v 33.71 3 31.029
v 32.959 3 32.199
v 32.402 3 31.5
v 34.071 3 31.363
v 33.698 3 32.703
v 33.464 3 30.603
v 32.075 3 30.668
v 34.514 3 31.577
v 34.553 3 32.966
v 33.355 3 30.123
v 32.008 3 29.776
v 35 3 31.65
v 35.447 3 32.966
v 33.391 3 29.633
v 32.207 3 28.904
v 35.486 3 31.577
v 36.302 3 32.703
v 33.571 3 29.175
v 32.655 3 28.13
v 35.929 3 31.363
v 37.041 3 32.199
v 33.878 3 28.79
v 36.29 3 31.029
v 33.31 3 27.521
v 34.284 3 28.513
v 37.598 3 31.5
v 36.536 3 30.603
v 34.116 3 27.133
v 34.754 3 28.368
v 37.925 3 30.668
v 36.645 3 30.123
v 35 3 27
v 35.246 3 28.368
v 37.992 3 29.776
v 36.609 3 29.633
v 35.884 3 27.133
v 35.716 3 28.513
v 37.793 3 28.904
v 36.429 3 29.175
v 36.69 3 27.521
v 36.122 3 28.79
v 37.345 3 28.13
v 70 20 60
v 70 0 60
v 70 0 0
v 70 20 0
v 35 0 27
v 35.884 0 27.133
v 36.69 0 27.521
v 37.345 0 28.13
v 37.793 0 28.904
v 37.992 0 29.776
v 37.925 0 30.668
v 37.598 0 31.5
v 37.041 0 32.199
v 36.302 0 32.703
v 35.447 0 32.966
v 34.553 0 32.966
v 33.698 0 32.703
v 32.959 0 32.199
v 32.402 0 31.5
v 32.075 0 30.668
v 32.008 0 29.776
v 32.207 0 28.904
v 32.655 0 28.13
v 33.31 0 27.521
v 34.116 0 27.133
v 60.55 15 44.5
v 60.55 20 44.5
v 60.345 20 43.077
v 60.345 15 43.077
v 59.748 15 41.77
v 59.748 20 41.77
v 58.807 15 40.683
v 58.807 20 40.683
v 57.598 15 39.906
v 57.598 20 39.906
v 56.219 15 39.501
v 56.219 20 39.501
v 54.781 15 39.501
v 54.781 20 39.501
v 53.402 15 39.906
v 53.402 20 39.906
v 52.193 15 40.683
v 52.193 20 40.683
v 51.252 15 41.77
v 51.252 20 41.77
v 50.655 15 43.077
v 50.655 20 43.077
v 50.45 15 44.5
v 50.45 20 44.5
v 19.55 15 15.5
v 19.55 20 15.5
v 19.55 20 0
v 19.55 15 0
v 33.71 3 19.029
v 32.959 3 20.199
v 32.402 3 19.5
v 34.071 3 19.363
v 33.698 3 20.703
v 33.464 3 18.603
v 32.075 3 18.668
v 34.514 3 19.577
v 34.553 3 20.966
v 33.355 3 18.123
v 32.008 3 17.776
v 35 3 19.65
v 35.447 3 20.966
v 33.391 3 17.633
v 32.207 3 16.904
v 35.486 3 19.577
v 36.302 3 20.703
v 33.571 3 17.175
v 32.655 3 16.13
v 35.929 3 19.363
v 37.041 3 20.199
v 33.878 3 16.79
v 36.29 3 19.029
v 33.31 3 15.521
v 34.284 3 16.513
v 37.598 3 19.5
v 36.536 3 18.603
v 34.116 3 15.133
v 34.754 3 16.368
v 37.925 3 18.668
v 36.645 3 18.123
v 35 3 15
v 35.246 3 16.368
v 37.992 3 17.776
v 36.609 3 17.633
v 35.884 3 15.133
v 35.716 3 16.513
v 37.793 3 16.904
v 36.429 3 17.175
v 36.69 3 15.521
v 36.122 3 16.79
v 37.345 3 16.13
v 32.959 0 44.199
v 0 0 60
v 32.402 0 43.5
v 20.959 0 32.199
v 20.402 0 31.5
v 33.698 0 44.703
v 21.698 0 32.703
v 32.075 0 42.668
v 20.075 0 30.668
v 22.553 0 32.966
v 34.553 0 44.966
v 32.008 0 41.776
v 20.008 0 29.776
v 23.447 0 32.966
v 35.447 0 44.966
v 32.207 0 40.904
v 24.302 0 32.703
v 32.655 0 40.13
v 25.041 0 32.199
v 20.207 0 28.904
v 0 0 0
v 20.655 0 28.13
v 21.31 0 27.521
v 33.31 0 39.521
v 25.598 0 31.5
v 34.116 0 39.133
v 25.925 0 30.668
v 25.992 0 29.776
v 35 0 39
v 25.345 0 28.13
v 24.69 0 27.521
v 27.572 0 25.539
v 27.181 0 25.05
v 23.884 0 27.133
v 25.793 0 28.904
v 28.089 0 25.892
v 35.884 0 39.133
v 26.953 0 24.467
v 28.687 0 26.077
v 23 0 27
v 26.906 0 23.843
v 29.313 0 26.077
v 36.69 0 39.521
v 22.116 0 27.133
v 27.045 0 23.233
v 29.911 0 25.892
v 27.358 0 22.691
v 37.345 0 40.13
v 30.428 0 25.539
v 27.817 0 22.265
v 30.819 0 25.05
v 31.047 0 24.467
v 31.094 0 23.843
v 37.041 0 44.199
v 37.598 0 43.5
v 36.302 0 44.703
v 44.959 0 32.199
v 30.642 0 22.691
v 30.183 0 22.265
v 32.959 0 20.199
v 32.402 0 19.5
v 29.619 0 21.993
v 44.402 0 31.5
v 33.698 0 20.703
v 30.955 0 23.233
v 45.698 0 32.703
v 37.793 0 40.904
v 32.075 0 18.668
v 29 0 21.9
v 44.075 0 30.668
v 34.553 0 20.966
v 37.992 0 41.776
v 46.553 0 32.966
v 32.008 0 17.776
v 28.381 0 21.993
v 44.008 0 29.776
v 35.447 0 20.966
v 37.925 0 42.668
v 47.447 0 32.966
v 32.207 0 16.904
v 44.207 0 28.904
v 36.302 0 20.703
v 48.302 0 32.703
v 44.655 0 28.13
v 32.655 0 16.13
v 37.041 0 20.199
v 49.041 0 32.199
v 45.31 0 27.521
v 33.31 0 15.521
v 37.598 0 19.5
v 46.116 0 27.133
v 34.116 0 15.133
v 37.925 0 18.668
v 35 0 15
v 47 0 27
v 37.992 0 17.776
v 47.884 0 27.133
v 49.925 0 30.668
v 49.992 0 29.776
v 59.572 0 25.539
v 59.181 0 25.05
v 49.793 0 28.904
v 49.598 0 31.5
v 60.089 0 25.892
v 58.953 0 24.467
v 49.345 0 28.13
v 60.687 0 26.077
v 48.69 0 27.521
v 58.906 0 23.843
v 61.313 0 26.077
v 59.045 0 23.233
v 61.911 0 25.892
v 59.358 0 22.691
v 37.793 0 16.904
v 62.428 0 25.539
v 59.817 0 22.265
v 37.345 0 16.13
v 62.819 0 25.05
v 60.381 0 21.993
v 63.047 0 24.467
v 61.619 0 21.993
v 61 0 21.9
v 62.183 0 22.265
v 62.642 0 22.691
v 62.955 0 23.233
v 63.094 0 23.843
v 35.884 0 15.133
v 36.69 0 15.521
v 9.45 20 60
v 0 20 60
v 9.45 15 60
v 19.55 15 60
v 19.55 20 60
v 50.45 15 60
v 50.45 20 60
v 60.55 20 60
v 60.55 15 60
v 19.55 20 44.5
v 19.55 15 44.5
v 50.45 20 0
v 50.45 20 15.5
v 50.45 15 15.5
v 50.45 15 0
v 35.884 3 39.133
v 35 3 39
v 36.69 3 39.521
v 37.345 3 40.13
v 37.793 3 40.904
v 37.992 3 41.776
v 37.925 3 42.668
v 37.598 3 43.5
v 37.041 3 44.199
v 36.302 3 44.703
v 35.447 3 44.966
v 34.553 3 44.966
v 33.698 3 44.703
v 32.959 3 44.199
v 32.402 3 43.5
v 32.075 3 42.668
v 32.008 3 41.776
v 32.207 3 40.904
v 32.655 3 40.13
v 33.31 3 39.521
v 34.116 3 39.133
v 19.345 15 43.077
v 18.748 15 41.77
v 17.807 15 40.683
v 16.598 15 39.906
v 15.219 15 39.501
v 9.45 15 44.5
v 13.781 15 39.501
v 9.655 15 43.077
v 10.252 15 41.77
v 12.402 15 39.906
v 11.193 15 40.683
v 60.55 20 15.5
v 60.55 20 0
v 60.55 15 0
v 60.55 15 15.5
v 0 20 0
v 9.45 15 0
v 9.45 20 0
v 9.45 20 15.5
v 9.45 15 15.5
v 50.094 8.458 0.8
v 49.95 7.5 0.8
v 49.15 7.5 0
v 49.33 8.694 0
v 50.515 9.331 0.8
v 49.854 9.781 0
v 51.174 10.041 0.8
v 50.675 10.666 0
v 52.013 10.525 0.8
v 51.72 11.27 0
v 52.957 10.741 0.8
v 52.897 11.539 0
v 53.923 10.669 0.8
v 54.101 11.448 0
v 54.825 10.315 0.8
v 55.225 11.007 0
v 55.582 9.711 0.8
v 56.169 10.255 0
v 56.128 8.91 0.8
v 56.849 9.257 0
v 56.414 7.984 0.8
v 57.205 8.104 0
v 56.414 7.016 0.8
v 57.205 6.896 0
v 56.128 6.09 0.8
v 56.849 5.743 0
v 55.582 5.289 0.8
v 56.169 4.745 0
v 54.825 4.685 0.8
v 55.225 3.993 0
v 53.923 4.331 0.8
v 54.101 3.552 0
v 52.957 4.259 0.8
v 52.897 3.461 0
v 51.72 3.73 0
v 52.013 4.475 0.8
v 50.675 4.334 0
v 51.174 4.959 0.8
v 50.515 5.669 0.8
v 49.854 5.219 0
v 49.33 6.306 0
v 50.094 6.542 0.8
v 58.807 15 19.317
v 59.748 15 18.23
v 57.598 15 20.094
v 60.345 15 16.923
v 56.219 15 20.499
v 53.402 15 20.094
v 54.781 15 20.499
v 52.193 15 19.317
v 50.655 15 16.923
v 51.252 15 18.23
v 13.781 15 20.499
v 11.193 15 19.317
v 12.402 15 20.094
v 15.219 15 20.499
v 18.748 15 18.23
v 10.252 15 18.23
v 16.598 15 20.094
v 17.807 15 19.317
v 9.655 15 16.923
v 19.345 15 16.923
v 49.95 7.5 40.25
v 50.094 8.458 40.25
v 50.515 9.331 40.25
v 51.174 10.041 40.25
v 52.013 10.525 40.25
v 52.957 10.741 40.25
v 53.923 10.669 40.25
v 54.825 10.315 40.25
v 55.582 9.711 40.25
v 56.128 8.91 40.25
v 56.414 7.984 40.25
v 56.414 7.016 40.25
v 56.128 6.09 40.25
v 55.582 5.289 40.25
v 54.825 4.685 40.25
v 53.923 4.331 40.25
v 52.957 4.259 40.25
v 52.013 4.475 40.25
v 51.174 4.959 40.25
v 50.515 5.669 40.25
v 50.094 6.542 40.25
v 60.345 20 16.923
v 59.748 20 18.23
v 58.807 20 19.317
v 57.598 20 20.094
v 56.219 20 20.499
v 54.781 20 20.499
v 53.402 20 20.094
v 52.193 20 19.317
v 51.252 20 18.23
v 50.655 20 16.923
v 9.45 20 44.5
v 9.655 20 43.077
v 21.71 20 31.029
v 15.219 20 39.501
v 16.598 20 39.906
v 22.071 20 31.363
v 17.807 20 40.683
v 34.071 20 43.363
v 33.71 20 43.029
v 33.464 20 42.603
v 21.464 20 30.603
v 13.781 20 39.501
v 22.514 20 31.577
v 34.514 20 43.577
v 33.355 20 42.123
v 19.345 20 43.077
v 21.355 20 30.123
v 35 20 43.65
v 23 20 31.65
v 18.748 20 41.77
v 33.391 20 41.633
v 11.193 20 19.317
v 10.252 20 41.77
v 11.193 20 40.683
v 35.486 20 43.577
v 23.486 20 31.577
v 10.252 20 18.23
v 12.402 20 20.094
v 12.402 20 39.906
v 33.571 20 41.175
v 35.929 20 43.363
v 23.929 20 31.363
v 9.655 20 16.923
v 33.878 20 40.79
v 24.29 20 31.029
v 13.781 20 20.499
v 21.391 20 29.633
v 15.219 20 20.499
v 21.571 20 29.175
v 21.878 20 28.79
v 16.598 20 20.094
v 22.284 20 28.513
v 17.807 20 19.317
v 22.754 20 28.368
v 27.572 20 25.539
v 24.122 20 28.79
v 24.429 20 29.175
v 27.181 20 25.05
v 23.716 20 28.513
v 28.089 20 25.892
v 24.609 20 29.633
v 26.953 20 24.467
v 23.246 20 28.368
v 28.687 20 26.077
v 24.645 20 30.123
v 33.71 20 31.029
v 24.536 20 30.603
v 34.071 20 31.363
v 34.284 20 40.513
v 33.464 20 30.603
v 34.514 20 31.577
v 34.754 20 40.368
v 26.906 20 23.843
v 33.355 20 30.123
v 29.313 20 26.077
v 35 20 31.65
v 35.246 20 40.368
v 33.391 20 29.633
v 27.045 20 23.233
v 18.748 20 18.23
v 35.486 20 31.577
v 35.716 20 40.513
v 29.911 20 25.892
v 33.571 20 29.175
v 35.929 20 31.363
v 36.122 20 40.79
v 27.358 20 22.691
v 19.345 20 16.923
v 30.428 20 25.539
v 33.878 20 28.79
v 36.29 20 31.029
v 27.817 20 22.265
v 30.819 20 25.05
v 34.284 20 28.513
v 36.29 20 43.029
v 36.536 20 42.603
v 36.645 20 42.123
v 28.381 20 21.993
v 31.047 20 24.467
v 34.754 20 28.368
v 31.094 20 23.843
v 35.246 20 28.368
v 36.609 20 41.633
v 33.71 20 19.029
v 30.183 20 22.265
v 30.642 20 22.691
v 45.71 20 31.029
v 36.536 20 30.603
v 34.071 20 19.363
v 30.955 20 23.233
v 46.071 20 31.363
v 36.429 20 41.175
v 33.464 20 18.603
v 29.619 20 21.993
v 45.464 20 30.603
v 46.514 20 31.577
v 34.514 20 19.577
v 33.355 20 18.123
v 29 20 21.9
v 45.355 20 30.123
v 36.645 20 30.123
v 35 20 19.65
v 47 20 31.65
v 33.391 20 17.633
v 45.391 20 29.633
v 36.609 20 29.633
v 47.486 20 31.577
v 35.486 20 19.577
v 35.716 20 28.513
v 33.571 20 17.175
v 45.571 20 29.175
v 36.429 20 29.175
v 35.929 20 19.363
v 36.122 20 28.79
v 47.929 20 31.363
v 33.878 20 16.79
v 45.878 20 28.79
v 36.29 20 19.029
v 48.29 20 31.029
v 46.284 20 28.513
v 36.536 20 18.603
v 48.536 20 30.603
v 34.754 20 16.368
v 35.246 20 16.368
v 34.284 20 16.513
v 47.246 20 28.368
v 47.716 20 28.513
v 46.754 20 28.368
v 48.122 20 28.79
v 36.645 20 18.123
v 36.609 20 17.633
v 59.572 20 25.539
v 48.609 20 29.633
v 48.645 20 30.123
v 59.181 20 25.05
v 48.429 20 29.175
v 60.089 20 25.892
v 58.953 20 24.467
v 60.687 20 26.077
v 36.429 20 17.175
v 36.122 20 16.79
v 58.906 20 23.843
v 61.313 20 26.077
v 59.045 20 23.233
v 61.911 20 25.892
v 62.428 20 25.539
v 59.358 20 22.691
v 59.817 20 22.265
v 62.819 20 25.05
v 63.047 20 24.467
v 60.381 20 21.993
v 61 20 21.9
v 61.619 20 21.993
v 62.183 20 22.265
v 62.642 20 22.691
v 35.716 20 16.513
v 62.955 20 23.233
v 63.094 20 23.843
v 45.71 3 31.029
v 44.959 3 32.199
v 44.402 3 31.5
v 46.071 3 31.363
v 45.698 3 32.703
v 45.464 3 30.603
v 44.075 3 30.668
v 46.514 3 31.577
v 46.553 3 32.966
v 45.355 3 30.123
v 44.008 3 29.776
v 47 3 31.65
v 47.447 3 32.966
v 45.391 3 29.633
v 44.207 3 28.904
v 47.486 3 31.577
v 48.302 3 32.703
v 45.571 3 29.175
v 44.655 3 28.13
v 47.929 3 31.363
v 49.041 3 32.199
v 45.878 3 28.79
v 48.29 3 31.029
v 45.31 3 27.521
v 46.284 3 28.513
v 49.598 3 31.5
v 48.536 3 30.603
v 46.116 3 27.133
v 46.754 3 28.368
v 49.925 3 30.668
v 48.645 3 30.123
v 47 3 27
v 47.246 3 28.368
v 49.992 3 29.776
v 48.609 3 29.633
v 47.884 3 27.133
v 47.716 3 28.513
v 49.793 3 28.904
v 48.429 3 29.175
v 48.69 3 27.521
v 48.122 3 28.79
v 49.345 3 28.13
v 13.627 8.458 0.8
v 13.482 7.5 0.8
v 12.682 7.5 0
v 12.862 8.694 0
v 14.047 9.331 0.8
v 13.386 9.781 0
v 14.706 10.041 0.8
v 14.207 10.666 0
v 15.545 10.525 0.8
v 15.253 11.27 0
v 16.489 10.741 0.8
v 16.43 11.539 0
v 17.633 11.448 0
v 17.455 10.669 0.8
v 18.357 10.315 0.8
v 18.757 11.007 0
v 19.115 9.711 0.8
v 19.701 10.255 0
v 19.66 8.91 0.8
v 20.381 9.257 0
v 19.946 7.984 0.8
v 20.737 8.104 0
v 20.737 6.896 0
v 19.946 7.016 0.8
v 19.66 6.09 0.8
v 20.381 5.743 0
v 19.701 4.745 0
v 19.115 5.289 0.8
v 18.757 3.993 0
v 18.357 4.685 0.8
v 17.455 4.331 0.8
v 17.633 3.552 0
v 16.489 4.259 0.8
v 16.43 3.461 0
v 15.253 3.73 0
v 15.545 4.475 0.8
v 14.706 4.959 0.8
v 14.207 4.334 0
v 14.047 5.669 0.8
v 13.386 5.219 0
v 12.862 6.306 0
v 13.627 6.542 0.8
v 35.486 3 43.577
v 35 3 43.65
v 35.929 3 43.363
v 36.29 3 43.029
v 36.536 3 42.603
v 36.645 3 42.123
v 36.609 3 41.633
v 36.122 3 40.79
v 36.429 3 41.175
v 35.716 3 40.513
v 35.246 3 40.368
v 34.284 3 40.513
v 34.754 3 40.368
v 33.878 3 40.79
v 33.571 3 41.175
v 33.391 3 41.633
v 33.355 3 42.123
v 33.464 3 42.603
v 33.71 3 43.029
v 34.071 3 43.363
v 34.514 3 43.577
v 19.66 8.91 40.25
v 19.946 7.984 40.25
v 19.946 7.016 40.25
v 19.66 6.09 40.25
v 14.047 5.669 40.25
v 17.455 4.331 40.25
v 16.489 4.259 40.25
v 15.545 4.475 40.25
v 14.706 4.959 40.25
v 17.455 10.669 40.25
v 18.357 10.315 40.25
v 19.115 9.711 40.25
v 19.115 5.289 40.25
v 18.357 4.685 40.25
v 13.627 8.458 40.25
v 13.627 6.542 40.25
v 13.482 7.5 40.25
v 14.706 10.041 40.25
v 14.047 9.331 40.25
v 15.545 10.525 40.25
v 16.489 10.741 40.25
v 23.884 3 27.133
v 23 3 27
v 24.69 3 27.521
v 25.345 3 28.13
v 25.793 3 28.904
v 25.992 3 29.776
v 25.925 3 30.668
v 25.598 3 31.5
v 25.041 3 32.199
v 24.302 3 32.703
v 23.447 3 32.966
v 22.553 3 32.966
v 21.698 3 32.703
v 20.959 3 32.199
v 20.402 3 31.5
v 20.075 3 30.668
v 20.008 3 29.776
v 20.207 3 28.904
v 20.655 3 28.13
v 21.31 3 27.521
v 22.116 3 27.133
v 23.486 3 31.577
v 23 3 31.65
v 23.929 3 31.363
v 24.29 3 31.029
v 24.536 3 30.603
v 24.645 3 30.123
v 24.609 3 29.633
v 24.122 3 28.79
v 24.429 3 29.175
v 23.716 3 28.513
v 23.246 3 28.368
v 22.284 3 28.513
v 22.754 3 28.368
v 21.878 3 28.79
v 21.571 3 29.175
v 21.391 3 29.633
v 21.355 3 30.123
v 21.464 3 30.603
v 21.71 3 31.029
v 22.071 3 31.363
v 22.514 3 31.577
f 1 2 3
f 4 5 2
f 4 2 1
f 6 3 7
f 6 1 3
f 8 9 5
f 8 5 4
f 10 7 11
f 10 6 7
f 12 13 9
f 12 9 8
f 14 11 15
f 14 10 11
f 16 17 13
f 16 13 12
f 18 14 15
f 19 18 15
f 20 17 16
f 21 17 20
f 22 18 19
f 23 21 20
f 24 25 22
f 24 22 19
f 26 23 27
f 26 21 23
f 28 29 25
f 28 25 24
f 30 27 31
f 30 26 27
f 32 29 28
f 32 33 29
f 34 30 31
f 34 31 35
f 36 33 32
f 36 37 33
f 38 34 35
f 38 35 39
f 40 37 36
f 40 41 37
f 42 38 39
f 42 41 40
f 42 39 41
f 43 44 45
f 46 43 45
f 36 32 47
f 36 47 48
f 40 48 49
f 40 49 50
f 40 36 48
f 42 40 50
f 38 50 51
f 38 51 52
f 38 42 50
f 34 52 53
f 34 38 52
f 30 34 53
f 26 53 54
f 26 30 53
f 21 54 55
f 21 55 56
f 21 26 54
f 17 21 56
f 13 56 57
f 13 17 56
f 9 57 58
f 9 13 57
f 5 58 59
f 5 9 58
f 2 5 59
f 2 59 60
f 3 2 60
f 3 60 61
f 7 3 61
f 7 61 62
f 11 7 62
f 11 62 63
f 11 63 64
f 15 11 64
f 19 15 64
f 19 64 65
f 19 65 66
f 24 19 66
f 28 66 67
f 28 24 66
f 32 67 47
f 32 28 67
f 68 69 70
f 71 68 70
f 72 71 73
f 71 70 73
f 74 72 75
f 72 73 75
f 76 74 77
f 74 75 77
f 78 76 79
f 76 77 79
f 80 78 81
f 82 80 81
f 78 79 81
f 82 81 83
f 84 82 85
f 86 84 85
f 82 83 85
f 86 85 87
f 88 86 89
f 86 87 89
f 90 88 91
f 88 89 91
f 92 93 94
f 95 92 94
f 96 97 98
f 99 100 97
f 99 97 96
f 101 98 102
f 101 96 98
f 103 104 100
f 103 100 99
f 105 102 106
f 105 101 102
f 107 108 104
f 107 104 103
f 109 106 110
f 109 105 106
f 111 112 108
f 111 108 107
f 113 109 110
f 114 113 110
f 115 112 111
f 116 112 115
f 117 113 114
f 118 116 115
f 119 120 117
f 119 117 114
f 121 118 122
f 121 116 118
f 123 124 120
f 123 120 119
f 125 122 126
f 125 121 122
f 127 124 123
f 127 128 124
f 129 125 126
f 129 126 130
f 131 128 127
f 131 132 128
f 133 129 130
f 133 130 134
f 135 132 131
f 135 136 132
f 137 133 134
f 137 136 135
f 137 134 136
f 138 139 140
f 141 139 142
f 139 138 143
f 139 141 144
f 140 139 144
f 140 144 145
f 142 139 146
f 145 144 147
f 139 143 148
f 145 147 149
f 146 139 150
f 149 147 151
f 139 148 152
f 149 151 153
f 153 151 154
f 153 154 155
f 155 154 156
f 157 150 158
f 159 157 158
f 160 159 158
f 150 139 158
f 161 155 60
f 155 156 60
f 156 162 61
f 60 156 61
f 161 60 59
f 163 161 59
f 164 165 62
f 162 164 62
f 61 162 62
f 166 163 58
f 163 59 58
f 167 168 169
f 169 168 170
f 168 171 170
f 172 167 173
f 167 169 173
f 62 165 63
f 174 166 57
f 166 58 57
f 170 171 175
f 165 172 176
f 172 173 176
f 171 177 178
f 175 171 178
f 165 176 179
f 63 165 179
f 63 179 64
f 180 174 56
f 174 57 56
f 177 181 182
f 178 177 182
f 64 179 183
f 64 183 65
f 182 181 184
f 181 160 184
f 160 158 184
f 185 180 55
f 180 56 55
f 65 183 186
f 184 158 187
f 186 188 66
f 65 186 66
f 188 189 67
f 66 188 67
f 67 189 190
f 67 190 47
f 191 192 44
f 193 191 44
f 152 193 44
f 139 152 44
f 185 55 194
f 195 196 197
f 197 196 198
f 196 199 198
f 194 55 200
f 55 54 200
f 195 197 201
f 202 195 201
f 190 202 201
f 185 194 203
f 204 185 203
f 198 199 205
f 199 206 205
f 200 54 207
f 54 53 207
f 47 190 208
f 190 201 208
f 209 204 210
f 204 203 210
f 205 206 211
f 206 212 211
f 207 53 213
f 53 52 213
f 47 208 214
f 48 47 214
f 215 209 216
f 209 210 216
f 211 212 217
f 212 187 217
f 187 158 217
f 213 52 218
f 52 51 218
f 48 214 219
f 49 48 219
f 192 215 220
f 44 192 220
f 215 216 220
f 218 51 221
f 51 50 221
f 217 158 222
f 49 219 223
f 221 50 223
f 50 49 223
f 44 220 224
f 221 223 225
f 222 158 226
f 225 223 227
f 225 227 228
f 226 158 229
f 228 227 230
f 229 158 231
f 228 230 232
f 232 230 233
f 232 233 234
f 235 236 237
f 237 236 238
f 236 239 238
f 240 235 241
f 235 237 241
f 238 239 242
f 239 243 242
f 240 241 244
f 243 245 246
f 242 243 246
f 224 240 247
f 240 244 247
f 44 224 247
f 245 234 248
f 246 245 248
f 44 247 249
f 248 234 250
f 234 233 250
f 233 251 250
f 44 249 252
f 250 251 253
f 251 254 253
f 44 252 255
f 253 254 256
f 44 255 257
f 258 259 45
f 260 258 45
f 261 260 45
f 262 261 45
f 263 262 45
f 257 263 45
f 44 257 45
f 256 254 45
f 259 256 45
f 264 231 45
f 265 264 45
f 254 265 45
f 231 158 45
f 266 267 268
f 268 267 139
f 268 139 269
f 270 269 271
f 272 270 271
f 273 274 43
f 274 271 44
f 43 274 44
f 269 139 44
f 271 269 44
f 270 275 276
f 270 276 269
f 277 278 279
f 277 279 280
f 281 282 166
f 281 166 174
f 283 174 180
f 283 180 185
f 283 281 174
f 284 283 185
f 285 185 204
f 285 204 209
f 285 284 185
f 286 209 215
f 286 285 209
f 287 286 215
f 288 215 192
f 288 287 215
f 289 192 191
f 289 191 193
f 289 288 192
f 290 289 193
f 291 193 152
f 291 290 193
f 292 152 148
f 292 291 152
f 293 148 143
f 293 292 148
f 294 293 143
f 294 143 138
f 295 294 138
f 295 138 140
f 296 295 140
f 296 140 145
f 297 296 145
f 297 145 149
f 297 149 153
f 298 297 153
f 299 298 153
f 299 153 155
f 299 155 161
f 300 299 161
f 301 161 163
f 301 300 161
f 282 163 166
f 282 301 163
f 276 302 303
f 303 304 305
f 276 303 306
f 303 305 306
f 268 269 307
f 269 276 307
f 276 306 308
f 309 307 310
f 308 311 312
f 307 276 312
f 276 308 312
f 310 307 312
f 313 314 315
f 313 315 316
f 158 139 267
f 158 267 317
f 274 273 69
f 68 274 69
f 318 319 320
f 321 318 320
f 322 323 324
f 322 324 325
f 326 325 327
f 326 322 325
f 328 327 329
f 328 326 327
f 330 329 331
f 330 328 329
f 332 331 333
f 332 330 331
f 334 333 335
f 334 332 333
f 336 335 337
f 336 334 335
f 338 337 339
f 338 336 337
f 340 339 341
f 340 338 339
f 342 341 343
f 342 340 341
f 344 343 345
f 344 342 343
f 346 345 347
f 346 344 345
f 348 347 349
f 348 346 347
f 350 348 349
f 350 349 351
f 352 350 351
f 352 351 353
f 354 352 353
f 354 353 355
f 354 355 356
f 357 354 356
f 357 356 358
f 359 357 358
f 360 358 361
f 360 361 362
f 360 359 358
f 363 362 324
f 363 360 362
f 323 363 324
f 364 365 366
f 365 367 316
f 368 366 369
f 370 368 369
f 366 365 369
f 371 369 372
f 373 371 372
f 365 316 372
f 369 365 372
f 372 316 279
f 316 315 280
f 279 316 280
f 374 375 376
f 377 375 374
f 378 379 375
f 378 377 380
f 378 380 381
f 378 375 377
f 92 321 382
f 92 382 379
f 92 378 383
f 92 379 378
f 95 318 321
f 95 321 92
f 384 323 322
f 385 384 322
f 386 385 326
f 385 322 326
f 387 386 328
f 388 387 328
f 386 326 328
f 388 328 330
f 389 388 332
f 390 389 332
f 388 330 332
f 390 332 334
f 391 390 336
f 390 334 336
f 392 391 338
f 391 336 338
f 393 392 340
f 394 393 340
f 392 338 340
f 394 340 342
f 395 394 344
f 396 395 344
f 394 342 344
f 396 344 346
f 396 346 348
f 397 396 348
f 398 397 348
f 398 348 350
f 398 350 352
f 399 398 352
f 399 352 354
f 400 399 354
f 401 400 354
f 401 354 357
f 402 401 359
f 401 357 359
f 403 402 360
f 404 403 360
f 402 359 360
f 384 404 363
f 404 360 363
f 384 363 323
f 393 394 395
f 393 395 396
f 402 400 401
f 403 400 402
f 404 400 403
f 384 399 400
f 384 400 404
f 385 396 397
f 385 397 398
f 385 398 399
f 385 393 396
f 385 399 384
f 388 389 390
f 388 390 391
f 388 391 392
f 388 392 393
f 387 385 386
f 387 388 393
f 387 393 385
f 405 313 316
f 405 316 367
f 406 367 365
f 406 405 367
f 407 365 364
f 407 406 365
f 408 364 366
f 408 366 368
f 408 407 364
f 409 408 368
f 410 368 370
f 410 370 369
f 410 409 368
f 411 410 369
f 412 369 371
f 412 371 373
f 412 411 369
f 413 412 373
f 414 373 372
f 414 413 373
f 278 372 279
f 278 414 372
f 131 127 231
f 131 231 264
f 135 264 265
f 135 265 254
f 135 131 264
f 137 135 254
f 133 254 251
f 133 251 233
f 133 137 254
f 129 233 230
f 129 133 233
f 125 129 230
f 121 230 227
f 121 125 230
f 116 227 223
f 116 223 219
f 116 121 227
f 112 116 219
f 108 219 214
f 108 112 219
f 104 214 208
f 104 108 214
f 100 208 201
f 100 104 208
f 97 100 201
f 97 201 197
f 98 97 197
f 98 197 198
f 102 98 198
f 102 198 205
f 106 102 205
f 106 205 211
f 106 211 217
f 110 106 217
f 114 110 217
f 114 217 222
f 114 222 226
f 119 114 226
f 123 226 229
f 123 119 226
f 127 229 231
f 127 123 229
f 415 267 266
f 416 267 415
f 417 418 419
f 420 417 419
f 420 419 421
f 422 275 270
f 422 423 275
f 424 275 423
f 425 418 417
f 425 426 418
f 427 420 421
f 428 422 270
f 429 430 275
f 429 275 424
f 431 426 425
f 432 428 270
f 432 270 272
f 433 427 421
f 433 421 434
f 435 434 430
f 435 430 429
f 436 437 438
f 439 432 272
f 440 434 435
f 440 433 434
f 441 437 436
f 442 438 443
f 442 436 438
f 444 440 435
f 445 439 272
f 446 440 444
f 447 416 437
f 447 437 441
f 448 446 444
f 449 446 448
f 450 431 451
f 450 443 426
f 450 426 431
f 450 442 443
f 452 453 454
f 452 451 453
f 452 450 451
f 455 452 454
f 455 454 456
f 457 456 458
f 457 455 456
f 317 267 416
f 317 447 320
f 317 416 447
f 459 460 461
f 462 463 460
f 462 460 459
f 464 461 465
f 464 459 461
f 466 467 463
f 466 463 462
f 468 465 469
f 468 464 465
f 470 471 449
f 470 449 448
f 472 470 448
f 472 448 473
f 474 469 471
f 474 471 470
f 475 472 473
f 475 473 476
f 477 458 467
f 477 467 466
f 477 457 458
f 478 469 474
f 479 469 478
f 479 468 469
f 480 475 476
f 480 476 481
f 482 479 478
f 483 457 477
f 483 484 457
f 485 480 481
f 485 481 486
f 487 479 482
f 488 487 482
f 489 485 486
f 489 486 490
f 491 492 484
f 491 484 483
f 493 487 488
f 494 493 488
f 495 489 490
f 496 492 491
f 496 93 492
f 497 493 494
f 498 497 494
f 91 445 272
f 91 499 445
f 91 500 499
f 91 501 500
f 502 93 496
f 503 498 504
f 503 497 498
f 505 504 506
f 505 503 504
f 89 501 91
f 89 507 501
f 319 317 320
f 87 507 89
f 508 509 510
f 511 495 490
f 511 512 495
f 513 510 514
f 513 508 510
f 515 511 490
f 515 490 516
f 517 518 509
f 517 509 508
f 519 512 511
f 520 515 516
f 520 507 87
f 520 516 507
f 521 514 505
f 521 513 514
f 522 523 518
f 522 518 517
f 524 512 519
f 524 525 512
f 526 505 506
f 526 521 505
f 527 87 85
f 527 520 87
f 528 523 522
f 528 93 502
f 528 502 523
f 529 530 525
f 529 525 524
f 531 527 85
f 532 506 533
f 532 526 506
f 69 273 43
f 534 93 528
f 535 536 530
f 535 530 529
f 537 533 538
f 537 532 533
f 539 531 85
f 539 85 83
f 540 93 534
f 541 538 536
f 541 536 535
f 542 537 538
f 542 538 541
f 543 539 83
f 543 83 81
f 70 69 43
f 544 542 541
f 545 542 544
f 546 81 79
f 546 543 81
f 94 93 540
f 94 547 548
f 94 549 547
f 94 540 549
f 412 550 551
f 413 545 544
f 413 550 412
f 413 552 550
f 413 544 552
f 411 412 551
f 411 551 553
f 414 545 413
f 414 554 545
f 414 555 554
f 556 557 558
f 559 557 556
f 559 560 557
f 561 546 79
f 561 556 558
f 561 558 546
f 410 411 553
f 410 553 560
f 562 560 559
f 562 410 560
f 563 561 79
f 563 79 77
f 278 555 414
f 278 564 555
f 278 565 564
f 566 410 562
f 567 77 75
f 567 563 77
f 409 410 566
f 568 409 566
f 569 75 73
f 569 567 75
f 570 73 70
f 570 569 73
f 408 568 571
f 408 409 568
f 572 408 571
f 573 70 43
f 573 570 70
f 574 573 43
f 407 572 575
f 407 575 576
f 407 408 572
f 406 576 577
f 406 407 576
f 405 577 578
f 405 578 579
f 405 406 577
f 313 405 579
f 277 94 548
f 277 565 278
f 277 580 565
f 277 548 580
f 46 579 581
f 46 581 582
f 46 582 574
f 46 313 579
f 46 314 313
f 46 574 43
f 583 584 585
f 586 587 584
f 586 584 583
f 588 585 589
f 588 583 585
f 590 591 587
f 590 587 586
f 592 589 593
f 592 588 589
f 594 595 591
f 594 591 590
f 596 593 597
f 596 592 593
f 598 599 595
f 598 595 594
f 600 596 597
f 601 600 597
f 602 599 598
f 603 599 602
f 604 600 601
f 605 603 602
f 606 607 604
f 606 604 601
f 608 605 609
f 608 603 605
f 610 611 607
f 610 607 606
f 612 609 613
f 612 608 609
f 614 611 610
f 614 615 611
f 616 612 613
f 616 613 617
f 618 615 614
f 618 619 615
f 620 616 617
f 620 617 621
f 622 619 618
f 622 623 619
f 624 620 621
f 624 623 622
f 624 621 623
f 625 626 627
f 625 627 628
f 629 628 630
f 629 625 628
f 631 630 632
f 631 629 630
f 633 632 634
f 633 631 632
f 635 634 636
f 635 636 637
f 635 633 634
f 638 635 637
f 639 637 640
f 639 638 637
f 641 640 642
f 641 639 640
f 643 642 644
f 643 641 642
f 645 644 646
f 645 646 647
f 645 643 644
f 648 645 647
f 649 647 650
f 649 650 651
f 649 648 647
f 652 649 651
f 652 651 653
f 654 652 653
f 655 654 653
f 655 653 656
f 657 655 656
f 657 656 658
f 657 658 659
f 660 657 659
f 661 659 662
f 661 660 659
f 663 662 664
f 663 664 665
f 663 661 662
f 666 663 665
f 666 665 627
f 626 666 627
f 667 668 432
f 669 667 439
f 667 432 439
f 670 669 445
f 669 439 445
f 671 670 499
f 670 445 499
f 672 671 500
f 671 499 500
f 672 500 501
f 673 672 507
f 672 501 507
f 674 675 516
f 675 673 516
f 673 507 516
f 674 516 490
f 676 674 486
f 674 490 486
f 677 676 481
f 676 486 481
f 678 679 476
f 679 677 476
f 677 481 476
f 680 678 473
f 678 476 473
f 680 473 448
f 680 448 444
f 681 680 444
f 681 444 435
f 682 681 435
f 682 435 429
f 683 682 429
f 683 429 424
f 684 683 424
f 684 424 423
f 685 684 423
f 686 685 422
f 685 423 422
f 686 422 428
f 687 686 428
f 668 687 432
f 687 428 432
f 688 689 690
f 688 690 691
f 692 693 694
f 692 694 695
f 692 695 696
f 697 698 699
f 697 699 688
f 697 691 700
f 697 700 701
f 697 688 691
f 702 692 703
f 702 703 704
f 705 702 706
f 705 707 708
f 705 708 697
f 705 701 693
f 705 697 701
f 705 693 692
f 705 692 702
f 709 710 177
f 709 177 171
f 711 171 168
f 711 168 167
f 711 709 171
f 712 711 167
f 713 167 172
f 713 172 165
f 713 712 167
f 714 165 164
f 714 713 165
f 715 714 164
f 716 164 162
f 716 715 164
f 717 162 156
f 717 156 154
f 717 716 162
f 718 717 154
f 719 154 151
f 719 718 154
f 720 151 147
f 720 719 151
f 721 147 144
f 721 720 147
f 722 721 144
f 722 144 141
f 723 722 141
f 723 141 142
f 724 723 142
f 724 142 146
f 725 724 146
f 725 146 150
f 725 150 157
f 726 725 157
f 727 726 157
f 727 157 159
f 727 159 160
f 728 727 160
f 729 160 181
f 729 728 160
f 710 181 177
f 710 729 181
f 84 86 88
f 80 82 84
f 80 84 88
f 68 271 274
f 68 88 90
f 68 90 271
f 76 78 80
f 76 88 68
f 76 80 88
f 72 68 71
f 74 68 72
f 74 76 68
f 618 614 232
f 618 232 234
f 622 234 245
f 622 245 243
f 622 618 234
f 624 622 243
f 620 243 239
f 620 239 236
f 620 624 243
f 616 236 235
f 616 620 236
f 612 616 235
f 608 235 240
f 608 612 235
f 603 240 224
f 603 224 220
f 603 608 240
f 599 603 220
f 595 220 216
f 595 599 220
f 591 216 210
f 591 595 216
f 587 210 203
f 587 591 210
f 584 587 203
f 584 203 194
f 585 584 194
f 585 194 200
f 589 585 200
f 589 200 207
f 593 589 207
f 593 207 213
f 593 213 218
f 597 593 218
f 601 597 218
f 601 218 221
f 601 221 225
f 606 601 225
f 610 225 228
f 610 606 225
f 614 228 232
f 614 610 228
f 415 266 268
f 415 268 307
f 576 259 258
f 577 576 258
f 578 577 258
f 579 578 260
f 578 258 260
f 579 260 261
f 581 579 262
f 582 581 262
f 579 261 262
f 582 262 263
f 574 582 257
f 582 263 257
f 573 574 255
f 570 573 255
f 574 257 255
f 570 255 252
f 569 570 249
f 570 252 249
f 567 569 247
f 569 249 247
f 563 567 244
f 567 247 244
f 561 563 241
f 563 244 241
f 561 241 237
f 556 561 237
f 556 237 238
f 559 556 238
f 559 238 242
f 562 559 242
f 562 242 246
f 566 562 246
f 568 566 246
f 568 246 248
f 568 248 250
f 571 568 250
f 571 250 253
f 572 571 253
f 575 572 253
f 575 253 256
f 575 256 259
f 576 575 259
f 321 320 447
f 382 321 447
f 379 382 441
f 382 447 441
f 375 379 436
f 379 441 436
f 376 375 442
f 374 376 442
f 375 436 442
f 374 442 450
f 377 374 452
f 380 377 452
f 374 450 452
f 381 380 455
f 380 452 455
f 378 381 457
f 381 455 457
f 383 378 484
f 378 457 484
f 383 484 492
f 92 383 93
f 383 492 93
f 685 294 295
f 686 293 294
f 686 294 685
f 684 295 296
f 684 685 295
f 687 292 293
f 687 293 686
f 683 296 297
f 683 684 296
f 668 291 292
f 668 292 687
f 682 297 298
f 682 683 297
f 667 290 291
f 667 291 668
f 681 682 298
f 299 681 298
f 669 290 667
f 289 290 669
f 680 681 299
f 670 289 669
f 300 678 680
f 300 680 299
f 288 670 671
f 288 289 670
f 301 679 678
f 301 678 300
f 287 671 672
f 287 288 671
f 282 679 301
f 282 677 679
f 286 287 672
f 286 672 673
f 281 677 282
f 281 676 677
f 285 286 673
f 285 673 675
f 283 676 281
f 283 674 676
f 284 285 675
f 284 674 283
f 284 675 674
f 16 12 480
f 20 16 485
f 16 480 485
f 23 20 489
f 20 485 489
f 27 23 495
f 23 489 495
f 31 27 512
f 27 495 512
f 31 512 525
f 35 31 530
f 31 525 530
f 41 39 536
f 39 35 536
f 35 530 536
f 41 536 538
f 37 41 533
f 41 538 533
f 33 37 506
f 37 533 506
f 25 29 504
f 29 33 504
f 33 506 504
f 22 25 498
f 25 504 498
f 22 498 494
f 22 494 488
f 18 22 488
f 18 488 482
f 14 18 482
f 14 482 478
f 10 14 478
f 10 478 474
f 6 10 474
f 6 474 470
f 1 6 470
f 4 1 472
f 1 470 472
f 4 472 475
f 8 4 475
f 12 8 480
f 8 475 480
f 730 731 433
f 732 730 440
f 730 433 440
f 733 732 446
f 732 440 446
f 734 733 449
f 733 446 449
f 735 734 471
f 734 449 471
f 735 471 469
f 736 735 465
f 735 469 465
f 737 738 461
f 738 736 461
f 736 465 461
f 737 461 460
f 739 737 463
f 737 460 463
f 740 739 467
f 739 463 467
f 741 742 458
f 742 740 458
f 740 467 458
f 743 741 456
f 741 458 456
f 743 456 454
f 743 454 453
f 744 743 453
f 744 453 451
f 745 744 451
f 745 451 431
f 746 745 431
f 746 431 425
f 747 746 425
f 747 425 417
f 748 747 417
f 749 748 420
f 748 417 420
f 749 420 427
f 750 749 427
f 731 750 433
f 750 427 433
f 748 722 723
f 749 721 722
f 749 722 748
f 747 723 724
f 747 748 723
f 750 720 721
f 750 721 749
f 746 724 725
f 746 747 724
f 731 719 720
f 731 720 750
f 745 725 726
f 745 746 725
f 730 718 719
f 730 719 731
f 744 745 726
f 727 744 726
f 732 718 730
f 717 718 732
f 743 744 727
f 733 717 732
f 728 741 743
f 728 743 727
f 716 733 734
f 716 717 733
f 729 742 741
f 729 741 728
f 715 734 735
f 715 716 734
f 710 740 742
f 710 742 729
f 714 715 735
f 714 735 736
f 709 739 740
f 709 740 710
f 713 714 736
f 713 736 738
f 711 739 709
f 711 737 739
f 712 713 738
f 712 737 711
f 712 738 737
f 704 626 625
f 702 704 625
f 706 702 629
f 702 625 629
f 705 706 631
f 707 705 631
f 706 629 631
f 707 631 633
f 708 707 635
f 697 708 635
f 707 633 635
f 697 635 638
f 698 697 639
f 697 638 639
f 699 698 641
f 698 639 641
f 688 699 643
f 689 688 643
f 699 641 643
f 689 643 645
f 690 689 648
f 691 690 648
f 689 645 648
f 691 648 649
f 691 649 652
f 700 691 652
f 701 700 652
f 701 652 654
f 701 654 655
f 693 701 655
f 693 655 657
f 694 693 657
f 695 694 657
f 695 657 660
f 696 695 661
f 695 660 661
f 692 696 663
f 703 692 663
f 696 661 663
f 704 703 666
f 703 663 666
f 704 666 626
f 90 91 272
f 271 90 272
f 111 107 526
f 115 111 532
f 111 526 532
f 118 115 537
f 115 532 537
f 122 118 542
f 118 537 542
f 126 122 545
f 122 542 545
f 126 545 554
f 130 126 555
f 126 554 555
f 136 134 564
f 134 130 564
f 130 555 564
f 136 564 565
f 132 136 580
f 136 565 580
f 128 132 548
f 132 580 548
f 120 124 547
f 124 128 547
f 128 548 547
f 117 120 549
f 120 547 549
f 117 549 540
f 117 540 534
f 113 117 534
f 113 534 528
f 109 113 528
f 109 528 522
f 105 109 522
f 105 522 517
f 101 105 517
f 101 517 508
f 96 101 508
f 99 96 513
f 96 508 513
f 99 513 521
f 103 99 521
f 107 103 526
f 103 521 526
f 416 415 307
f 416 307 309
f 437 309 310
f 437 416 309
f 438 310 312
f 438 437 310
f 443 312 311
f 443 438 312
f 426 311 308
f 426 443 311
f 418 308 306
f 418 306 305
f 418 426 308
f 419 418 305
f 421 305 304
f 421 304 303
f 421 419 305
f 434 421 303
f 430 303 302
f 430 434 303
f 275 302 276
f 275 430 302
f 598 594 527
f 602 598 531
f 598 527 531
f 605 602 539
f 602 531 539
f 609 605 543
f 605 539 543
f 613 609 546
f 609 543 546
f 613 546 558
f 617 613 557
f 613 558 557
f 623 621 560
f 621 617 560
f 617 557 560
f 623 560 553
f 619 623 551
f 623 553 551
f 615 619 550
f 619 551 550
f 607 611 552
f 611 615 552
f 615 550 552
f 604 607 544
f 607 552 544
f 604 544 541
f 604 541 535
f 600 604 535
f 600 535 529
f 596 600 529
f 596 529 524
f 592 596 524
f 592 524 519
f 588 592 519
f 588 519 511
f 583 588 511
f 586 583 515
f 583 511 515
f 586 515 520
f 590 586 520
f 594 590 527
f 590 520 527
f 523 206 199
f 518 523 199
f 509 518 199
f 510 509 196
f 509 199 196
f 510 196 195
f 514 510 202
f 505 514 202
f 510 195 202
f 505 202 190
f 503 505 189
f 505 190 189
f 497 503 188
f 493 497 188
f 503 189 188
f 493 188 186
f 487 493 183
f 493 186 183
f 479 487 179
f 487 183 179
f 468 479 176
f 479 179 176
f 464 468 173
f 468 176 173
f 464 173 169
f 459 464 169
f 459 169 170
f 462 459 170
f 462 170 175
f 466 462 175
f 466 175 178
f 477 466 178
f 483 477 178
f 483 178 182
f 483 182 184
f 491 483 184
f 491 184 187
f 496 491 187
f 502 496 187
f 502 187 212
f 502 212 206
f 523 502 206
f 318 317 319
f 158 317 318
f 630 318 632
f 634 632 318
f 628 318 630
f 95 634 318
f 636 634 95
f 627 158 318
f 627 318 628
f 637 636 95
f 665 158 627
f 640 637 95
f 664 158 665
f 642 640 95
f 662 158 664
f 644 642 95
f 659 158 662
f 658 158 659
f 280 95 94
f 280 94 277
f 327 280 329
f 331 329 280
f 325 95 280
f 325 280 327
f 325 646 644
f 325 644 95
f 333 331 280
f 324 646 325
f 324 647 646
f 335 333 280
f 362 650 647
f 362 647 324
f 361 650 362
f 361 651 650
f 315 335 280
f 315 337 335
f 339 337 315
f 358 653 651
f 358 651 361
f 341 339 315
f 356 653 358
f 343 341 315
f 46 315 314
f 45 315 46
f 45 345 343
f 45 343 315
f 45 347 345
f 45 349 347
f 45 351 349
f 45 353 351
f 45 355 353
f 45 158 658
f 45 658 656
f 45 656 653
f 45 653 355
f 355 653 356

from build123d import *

# Parameters (mm, degrees)
SKETCH3_W           = 70
SKETCH3_H           = 60
BOSS_EXTRUDE3_DEPTH = 20
SKETCH4_R           = 1.65
CUT_EXTRUDE1_DEPTH  = 95.339811321
SKETCH6_R           = 2.1
CUT_EXTRUDE2_DEPTH  = 95.339811321
SKETCH9_R           = 3.25
CUT_EXTRUDE3_DEPTH  = 40.25
CUT_EXTRUDE4_START  = -3
SKETCH11_R          = 3
SKETCH11_R_2        = 1.65
CUT_EXTRUDE4_DEPTH  = 3
CHAMFER1_SIZE       = 0.8
CUT_EXTRUDE5_DEPTH  = 5


with BuildPart() as part:
    # Sketch3 → Boss-Extrude3 (new body)
    with BuildSketch(Plane(origin=(0, 0, 0), x_dir=(1, 0, 0), z_dir=(0, 1, 0))):
        with Locations((35, -30)):
            Rectangle(SKETCH3_W, SKETCH3_H)
    extrude(amount=BOSS_EXTRUDE3_DEPTH)

    # Sketch4 → Cut-Extrude1 (cut, through all)
    with BuildSketch(Plane(origin=(0, 20, 0), x_dir=(1, 0, 0), z_dir=(0, 1, 0))):
        with Locations(Location((35, -30, 0), (0, 0, 270))):
            Circle(SKETCH4_R)
        with Locations(Location((35, -18, 0), (0, 0, 270))):
            Circle(SKETCH4_R)
        with Locations(Location((47, -30, 0), (0, 0, 270))):
            Circle(SKETCH4_R)
        with Locations(Location((35, -42, 0), (0, 0, 270))):
            Circle(SKETCH4_R)
        with Locations(Location((23, -30, 0), (0, 0, 270))):
            Circle(SKETCH4_R)
    extrude(amount=-CUT_EXTRUDE1_DEPTH, mode=Mode.SUBTRACT)

    # Sketch6 → Cut-Extrude2 (cut, through all)
    with BuildSketch(Plane.XZ):
        with Locations(Location((61, 24, 0), (0, 0, 270))):
            Circle(SKETCH6_R)
        with Locations(Location((29, 24, 0), (0, 0, 270))):
            Circle(SKETCH6_R)
    extrude(amount=-CUT_EXTRUDE2_DEPTH, mode=Mode.SUBTRACT)

    # Sketch9 → Cut-Extrude3 (cut)
    with BuildSketch(Plane(origin=(0, 0, 0), x_dir=(-1, 0, 0), z_dir=(0, 0, -1))):
        with Locations((-53.2, 7.5)):
            Circle(SKETCH9_R)
        with Locations((-16.732176158, 7.5)):
            Circle(SKETCH9_R)
    extrude(amount=-CUT_EXTRUDE3_DEPTH, mode=Mode.SUBTRACT)

    # Sketch11 → Cut-Extrude4 (cut)
    # profile 1 of 10: a face of its own
    with BuildSketch(Plane.XZ.offset(CUT_EXTRUDE4_START)):
        with Locations(Location((35, 18, 0), (0, 0, 270))):
            Circle(SKETCH11_R)
        with Locations(Location((35, 18, 0), (0, 0, 90))):
            Circle(SKETCH11_R_2, mode=Mode.SUBTRACT)
    # profile 2 of 10: a face of its own
    with BuildSketch(Plane.XZ.offset(CUT_EXTRUDE4_START)):
        with Locations(Location((35, 30, 0), (0, 0, 270))):
            Circle(SKETCH11_R)
        with Locations(Location((35, 30, 0), (0, 0, 90))):
            Circle(SKETCH11_R_2, mode=Mode.SUBTRACT)
    # profile 3 of 10: a face of its own
    with BuildSketch(Plane.XZ.offset(CUT_EXTRUDE4_START)):
        with Locations(Location((47, 30, 0), (0, 0, 270))):
            Circle(SKETCH11_R)
        with Locations(Location((47, 30, 0), (0, 0, 90))):
            Circle(SKETCH11_R_2, mode=Mode.SUBTRACT)
    # profile 4 of 10: a face of its own
    with BuildSketch(Plane.XZ.offset(CUT_EXTRUDE4_START)):
        with Locations(Location((23, 30, 0), (0, 0, 270))):
            Circle(SKETCH11_R)
        with Locations(Location((23, 30, 0), (0, 0, 90))):
            Circle(SKETCH11_R_2, mode=Mode.SUBTRACT)
    # profile 5 of 10: a face of its own
    with BuildSketch(Plane.XZ.offset(CUT_EXTRUDE4_START)):
        with Locations(Location((35, 42, 0), (0, 0, 270))):
            Circle(SKETCH11_R)
        with Locations(Location((35, 42, 0), (0, 0, 90))):
            Circle(SKETCH11_R_2, mode=Mode.SUBTRACT)
    # profile 6 of 10: a face of its own
    with BuildSketch(Plane.XZ.offset(CUT_EXTRUDE4_START)):
        with Locations(Location((35, 42, 0), (0, 0, 90))):
            Circle(SKETCH11_R_2)
    # profile 7 of 10: a face of its own
    with BuildSketch(Plane.XZ.offset(CUT_EXTRUDE4_START)):
        with Locations(Location((23, 30, 0), (0, 0, 90))):
            Circle(SKETCH11_R_2)
    # profile 8 of 10: a face of its own
    with BuildSketch(Plane.XZ.offset(CUT_EXTRUDE4_START)):
        with Locations(Location((35, 30, 0), (0, 0, 90))):
            Circle(SKETCH11_R_2)
    # profile 9 of 10: a face of its own
    with BuildSketch(Plane.XZ.offset(CUT_EXTRUDE4_START)):
        with Locations(Location((47, 30, 0), (0, 0, 90))):
            Circle(SKETCH11_R_2)
    # profile 10 of 10: a face of its own
    with BuildSketch(Plane.XZ.offset(CUT_EXTRUDE4_START)):
        with Locations(Location((35, 18, 0), (0, 0, 90))):
            Circle(SKETCH11_R_2)
    extrude(amount=CUT_EXTRUDE4_DEPTH, mode=Mode.SUBTRACT)

    # Chamfer1
    chamfer1_edges = [part.edges().sort_by_distance(p)[0] for p in [
        (56.45, 7.5, 0),
        (19.982176158, 7.5, 0),
    ]]
    chamfer(chamfer1_edges, length=CHAMFER1_SIZE)

    # Sketch12 → Cut-Extrude5 (cut)
    with BuildSketch(Plane(origin=(0, 20, 0), x_dir=(1, 0, 0), z_dir=(0, 1, 0))):
        with BuildLine():
            Line((9.45, -60.104949747), (9.45, -44.5))
            ThreePointArc((9.45, -44.5), (14.5, -39.45), (19.55, -44.5))
            Line((19.55, -44.5), (19.55, -60.104949747))
            ThreePointArc((19.55, -60.104949747), (14.5, -65.154949747), (9.45, -60.104949747))
        make_face()
        with BuildLine():
            Line((60.55, -60.104949747), (60.55, -44.5))
            ThreePointArc((60.55, -44.5), (55.5, -39.45), (50.45, -44.5))
            Line((50.45, -44.5), (50.45, -60.104949747))
            ThreePointArc((50.45, -60.104949747), (55.5, -65.154949747), (60.55, -60.104949747))
        make_face()
        with BuildLine():
            Line((60.55, 0.104949747), (60.55, -15.5))
            ThreePointArc((60.55, -15.5), (55.5, -20.55), (50.45, -15.5))
            Line((50.45, -15.5), (50.45, 0.104949747))
            ThreePointArc((50.45, 0.104949747), (55.5, 5.154949747), (60.55, 0.104949747))
        make_face()
        with BuildLine():
            Line((9.45, 0.104949747), (9.45, -15.5))
            ThreePointArc((9.45, -15.5), (14.5, -20.55), (19.55, -15.5))
            Line((19.55, -15.5), (19.55, 0.104949747))
            ThreePointArc((19.55, 0.104949747), (14.5, 5.154949747), (9.45, 0.104949747))
        make_face()
    extrude(amount=-CUT_EXTRUDE5_DEPTH, mode=Mode.SUBTRACT)


solid = part.part
